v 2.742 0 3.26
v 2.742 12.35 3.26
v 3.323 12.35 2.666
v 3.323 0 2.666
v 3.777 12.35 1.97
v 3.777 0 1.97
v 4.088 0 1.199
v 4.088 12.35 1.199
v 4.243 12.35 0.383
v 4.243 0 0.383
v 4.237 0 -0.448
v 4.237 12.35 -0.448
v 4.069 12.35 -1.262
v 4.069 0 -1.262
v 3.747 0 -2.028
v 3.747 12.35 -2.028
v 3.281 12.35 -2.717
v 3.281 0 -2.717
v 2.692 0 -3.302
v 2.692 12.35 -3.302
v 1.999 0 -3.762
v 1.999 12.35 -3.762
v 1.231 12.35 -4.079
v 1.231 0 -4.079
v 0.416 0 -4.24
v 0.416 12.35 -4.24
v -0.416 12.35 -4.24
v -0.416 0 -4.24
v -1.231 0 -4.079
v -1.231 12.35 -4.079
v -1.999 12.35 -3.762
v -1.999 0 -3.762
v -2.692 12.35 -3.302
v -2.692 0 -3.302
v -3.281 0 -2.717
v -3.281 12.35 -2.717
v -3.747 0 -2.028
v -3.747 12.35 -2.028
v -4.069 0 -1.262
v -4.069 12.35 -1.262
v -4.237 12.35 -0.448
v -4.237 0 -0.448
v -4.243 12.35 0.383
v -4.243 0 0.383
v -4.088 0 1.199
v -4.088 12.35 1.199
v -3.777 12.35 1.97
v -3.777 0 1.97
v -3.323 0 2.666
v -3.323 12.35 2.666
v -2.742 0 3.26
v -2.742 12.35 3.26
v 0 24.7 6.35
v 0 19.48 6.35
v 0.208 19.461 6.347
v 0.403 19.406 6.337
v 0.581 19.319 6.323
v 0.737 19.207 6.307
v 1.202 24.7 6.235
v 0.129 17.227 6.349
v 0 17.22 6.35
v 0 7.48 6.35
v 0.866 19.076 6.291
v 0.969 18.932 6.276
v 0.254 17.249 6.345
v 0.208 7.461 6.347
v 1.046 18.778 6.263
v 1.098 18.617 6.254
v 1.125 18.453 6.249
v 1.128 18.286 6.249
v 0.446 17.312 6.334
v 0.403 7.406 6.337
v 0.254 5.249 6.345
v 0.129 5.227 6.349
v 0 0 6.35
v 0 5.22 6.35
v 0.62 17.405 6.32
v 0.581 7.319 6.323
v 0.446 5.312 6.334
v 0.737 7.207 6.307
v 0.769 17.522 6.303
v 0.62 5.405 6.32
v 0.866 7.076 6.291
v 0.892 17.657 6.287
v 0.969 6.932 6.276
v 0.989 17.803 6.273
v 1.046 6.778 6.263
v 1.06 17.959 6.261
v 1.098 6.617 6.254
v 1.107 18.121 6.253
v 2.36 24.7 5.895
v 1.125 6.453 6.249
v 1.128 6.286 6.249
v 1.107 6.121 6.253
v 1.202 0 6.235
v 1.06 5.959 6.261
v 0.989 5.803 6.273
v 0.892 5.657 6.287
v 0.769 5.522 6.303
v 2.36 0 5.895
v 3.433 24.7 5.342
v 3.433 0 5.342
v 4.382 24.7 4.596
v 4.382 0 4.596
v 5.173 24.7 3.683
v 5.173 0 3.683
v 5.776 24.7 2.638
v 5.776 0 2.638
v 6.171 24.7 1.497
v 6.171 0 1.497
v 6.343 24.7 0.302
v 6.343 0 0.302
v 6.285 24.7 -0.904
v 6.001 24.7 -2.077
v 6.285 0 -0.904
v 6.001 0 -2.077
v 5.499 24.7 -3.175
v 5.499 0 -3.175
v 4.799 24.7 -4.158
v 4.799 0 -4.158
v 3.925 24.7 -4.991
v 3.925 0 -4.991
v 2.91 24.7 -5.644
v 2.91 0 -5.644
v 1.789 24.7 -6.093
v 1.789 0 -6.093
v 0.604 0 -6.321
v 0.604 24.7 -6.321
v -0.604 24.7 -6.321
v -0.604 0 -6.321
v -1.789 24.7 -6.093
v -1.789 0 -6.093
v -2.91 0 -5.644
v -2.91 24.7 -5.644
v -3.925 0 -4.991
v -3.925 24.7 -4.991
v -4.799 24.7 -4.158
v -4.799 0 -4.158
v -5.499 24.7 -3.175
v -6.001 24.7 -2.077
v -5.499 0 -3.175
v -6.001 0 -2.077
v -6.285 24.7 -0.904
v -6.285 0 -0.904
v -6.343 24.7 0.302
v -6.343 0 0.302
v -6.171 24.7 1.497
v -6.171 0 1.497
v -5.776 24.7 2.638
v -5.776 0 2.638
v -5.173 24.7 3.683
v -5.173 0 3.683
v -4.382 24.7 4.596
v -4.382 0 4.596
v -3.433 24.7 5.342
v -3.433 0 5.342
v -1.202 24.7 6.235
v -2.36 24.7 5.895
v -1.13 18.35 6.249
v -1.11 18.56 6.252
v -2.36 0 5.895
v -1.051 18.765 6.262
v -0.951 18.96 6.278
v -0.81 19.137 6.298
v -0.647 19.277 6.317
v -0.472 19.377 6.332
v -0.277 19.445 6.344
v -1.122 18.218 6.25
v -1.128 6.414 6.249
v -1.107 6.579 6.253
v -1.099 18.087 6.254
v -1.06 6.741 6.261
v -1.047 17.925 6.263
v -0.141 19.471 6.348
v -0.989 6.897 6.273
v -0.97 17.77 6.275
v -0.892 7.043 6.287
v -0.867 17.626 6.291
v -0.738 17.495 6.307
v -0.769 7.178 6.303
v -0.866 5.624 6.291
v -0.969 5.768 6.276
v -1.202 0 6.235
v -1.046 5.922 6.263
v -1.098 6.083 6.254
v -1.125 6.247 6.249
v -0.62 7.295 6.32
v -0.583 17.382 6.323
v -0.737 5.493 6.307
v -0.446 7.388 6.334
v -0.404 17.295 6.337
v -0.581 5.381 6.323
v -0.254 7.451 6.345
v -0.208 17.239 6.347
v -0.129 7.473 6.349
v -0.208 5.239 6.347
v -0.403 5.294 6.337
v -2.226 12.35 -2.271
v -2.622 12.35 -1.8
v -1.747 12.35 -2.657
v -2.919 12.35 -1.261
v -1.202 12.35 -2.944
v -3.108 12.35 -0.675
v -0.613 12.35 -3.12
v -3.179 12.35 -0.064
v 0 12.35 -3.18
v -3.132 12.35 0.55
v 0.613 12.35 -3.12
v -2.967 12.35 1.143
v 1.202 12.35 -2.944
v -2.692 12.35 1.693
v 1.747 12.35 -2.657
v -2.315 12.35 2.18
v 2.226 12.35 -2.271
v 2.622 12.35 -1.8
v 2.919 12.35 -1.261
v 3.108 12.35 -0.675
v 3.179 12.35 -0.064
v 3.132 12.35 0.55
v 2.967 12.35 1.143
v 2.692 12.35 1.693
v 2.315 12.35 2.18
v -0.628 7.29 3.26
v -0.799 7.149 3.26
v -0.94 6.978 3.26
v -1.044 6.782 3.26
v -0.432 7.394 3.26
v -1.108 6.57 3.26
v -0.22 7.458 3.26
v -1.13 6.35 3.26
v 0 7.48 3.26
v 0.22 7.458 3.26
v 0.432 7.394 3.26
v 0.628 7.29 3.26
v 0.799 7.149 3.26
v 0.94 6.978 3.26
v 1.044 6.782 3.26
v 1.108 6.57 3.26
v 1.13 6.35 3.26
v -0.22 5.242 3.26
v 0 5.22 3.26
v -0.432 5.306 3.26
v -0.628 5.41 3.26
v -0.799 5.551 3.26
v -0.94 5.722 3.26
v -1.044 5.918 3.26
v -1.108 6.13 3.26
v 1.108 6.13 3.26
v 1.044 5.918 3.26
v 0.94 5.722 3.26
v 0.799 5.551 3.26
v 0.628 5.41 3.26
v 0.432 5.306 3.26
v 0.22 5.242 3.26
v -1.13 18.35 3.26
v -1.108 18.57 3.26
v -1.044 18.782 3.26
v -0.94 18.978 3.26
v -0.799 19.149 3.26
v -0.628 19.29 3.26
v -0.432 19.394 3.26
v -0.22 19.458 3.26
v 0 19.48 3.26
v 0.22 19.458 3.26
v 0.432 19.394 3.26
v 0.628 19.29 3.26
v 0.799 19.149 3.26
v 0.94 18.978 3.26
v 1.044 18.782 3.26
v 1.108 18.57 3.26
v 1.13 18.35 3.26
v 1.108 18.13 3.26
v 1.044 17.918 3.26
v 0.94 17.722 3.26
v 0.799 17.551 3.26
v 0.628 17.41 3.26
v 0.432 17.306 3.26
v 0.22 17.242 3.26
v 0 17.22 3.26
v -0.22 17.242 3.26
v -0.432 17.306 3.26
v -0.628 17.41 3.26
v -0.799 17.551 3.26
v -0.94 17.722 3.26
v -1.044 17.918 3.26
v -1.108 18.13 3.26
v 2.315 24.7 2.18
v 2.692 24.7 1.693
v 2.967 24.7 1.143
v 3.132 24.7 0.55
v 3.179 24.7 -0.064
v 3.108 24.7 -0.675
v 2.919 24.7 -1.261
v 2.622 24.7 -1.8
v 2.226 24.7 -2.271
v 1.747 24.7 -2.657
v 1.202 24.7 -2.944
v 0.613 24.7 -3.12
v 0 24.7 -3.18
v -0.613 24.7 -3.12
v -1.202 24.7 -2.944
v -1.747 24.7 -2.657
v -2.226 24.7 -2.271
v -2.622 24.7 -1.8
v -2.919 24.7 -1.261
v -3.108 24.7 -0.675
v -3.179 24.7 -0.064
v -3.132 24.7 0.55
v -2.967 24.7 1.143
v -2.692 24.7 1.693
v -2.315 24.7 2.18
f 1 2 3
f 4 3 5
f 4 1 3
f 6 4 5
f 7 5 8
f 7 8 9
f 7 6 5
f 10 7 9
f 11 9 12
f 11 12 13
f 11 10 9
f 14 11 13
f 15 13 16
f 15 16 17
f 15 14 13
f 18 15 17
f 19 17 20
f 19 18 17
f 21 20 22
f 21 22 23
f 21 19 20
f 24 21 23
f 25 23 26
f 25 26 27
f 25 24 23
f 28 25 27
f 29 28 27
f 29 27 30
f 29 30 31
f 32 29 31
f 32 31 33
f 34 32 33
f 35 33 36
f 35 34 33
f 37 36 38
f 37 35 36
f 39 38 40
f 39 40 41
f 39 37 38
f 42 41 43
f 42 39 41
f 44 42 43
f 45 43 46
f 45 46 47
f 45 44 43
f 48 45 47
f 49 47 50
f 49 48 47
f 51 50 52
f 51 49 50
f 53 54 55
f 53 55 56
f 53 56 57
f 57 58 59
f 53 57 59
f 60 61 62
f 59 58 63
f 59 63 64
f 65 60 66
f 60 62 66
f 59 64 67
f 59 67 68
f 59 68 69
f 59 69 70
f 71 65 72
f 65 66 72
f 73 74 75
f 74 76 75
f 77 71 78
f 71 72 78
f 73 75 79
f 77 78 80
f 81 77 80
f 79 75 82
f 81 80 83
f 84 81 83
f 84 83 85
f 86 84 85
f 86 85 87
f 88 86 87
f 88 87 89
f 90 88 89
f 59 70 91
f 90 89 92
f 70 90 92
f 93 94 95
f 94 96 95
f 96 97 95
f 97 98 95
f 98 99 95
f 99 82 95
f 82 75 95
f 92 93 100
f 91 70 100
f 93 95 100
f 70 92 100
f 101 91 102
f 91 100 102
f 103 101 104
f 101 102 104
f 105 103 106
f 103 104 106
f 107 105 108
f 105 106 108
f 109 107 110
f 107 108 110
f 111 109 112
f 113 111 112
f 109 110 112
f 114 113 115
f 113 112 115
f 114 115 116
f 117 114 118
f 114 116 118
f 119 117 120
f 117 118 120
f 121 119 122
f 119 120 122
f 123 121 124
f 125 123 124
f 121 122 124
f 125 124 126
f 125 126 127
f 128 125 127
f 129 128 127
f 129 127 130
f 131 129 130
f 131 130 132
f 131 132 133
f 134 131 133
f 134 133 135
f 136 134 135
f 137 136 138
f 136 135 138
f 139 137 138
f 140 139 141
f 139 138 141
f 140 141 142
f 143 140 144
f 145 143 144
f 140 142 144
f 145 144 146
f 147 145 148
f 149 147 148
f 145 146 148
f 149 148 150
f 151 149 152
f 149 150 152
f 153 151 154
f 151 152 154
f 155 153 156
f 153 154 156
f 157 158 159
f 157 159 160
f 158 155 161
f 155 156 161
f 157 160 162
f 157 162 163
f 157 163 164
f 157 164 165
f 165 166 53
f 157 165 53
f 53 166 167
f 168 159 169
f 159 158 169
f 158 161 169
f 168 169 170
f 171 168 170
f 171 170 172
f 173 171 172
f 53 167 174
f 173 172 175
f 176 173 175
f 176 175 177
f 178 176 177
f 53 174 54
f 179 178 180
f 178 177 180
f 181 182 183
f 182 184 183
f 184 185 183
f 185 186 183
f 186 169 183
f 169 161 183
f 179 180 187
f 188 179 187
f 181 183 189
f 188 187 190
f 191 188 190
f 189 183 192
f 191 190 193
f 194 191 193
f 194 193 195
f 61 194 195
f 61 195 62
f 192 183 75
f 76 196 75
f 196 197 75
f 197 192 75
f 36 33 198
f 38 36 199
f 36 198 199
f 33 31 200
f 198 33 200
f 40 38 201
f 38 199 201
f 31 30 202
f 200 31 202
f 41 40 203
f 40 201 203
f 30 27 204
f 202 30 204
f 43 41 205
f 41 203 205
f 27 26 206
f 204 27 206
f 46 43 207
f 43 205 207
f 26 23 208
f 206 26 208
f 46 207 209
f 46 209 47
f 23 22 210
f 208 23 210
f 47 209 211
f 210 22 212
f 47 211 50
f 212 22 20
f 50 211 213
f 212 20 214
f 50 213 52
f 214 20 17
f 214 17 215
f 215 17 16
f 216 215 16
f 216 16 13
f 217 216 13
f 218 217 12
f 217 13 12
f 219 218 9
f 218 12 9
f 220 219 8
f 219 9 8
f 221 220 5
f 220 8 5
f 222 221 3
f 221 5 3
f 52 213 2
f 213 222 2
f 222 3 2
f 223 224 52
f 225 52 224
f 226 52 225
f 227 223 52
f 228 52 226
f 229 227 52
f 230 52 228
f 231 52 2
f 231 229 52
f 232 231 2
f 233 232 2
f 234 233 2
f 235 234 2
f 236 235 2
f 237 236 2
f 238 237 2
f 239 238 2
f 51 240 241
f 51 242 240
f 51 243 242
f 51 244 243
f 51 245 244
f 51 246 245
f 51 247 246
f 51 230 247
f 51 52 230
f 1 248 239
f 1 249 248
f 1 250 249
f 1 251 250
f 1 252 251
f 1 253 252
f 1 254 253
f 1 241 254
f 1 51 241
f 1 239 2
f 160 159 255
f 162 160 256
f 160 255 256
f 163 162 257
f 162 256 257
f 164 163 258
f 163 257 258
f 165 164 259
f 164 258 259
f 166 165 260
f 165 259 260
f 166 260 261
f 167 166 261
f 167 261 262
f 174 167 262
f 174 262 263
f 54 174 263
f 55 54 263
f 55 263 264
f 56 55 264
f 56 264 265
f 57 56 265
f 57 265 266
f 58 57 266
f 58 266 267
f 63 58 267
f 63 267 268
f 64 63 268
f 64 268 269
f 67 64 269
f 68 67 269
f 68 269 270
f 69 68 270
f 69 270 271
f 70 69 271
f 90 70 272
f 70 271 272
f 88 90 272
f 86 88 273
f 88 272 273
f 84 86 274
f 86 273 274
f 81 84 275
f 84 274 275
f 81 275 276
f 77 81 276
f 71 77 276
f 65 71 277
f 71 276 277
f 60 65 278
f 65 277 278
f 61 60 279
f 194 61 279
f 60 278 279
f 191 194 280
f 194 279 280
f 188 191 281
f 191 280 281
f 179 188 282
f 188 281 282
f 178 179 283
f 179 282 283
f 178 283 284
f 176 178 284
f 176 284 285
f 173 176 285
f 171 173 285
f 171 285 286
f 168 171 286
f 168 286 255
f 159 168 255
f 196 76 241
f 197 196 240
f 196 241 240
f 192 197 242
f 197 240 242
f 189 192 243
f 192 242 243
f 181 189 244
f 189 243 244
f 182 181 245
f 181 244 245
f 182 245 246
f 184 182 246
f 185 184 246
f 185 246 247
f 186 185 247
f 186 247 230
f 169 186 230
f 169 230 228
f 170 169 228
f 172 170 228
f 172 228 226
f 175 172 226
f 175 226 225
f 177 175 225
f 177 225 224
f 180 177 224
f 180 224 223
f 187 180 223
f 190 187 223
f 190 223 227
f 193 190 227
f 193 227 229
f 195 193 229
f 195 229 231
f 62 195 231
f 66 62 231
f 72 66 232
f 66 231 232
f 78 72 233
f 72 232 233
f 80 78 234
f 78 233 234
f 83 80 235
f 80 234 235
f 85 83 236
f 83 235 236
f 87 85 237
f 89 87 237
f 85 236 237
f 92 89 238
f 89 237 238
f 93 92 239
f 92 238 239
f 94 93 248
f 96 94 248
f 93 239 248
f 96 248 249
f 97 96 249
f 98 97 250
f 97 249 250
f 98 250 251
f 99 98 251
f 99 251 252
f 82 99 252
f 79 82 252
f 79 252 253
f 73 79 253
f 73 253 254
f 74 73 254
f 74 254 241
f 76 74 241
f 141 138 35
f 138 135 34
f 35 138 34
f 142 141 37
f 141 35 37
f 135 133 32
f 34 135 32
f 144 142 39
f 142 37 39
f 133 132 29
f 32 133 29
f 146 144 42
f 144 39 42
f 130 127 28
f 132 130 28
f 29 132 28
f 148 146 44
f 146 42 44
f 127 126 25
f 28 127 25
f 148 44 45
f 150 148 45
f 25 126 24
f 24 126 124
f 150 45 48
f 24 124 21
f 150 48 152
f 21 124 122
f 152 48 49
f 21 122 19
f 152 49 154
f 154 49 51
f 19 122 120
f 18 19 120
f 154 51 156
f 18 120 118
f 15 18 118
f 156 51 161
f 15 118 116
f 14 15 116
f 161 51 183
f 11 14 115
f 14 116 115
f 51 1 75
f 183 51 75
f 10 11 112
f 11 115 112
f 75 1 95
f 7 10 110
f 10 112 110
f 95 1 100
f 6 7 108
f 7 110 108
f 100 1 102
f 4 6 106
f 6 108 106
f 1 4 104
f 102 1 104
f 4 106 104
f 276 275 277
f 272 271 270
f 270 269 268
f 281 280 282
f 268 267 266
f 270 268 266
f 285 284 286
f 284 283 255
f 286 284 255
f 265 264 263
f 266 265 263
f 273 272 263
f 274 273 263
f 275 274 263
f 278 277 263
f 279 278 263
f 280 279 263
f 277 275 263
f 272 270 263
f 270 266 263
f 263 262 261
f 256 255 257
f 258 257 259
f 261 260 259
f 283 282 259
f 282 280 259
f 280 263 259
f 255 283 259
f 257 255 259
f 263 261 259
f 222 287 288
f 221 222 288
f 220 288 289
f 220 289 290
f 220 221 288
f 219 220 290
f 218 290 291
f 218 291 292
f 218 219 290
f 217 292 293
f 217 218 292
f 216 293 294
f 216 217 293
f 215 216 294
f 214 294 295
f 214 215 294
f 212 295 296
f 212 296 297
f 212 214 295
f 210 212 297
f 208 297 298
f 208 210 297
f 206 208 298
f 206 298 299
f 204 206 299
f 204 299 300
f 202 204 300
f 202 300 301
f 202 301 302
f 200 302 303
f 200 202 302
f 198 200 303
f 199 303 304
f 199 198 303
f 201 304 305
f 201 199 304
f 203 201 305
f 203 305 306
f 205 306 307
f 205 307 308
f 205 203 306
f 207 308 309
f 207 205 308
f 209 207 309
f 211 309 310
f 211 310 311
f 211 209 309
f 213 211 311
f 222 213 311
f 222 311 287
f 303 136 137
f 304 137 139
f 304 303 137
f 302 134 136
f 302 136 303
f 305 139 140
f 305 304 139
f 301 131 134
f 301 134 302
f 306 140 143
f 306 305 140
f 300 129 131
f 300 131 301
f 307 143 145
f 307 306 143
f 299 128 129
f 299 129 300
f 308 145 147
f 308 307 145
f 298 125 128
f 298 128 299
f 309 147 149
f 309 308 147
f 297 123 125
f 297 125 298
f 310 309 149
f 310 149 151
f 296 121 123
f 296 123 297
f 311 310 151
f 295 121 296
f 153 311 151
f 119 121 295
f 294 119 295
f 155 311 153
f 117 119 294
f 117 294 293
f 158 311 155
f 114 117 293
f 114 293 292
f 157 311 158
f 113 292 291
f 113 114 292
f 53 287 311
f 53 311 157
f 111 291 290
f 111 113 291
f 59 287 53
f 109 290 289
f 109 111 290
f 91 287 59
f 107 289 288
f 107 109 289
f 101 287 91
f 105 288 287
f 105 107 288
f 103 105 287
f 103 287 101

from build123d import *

# Parameters (mm, degrees)
SKETCH1_R           = 6.35
BOSS_EXTRUDE1_DEPTH = 12.35
SKETCH4_R           = 6.35
BOSS_EXTRUDE2_DEPTH = 12.35
SKETCH5_R           = 1.13
CUT_EXTRUDE2_DEPTH  = 28.253825364


with BuildPart() as part:
    # Sketch1 → Boss-Extrude1 (new body)
    with BuildSketch(Plane(origin=(0, 0, 0), x_dir=(1, 0, 0), z_dir=(0, 1, 0))):
        with Locations(Location((0, 0, 0), (0, 0, 270))):
            Circle(SKETCH1_R)
        with BuildLine():
            Line((-2.742383206, -3.260332823), (2.742383206, -3.260332823))
            ThreePointArc((2.742383206, -3.260332823), (0, 4.260332823), (-2.742383206, -3.260332823))
        make_face(mode=Mode.SUBTRACT)
    extrude(amount=BOSS_EXTRUDE1_DEPTH)

    # Sketch4 → Boss-Extrude2 (add)
    with BuildSketch(Plane(origin=(0, 12.35, 0), x_dir=(1, 0, 0), z_dir=(0, 1, 0))):
        with Locations(Location((0, 0, 0), (0, 0, 270))):
            Circle(SKETCH4_R)
        with BuildLine():
            Line((-2.315167381, -2.18), (2.315167381, -2.18))
            ThreePointArc((2.315167381, -2.18), (0, 3.18), (-2.315167381, -2.18))
        make_face(mode=Mode.SUBTRACT)
    extrude(amount=BOSS_EXTRUDE2_DEPTH)

    # Sketch5 → Cut-Extrude2 (cut, through all)
    with BuildSketch(Plane(origin=(0, 0, 3.260332823), x_dir=(-1, 0, 0), z_dir=(0, 0, -1))):
        with Locations((0, 18.35)):
            Circle(SKETCH5_R)
        with Locations(Location((0, 6.35, 0), (0, 0, 270))):
            Circle(SKETCH5_R)
    extrude(amount=-CUT_EXTRUDE2_DEPTH, mode=Mode.SUBTRACT)


solid = part.part
